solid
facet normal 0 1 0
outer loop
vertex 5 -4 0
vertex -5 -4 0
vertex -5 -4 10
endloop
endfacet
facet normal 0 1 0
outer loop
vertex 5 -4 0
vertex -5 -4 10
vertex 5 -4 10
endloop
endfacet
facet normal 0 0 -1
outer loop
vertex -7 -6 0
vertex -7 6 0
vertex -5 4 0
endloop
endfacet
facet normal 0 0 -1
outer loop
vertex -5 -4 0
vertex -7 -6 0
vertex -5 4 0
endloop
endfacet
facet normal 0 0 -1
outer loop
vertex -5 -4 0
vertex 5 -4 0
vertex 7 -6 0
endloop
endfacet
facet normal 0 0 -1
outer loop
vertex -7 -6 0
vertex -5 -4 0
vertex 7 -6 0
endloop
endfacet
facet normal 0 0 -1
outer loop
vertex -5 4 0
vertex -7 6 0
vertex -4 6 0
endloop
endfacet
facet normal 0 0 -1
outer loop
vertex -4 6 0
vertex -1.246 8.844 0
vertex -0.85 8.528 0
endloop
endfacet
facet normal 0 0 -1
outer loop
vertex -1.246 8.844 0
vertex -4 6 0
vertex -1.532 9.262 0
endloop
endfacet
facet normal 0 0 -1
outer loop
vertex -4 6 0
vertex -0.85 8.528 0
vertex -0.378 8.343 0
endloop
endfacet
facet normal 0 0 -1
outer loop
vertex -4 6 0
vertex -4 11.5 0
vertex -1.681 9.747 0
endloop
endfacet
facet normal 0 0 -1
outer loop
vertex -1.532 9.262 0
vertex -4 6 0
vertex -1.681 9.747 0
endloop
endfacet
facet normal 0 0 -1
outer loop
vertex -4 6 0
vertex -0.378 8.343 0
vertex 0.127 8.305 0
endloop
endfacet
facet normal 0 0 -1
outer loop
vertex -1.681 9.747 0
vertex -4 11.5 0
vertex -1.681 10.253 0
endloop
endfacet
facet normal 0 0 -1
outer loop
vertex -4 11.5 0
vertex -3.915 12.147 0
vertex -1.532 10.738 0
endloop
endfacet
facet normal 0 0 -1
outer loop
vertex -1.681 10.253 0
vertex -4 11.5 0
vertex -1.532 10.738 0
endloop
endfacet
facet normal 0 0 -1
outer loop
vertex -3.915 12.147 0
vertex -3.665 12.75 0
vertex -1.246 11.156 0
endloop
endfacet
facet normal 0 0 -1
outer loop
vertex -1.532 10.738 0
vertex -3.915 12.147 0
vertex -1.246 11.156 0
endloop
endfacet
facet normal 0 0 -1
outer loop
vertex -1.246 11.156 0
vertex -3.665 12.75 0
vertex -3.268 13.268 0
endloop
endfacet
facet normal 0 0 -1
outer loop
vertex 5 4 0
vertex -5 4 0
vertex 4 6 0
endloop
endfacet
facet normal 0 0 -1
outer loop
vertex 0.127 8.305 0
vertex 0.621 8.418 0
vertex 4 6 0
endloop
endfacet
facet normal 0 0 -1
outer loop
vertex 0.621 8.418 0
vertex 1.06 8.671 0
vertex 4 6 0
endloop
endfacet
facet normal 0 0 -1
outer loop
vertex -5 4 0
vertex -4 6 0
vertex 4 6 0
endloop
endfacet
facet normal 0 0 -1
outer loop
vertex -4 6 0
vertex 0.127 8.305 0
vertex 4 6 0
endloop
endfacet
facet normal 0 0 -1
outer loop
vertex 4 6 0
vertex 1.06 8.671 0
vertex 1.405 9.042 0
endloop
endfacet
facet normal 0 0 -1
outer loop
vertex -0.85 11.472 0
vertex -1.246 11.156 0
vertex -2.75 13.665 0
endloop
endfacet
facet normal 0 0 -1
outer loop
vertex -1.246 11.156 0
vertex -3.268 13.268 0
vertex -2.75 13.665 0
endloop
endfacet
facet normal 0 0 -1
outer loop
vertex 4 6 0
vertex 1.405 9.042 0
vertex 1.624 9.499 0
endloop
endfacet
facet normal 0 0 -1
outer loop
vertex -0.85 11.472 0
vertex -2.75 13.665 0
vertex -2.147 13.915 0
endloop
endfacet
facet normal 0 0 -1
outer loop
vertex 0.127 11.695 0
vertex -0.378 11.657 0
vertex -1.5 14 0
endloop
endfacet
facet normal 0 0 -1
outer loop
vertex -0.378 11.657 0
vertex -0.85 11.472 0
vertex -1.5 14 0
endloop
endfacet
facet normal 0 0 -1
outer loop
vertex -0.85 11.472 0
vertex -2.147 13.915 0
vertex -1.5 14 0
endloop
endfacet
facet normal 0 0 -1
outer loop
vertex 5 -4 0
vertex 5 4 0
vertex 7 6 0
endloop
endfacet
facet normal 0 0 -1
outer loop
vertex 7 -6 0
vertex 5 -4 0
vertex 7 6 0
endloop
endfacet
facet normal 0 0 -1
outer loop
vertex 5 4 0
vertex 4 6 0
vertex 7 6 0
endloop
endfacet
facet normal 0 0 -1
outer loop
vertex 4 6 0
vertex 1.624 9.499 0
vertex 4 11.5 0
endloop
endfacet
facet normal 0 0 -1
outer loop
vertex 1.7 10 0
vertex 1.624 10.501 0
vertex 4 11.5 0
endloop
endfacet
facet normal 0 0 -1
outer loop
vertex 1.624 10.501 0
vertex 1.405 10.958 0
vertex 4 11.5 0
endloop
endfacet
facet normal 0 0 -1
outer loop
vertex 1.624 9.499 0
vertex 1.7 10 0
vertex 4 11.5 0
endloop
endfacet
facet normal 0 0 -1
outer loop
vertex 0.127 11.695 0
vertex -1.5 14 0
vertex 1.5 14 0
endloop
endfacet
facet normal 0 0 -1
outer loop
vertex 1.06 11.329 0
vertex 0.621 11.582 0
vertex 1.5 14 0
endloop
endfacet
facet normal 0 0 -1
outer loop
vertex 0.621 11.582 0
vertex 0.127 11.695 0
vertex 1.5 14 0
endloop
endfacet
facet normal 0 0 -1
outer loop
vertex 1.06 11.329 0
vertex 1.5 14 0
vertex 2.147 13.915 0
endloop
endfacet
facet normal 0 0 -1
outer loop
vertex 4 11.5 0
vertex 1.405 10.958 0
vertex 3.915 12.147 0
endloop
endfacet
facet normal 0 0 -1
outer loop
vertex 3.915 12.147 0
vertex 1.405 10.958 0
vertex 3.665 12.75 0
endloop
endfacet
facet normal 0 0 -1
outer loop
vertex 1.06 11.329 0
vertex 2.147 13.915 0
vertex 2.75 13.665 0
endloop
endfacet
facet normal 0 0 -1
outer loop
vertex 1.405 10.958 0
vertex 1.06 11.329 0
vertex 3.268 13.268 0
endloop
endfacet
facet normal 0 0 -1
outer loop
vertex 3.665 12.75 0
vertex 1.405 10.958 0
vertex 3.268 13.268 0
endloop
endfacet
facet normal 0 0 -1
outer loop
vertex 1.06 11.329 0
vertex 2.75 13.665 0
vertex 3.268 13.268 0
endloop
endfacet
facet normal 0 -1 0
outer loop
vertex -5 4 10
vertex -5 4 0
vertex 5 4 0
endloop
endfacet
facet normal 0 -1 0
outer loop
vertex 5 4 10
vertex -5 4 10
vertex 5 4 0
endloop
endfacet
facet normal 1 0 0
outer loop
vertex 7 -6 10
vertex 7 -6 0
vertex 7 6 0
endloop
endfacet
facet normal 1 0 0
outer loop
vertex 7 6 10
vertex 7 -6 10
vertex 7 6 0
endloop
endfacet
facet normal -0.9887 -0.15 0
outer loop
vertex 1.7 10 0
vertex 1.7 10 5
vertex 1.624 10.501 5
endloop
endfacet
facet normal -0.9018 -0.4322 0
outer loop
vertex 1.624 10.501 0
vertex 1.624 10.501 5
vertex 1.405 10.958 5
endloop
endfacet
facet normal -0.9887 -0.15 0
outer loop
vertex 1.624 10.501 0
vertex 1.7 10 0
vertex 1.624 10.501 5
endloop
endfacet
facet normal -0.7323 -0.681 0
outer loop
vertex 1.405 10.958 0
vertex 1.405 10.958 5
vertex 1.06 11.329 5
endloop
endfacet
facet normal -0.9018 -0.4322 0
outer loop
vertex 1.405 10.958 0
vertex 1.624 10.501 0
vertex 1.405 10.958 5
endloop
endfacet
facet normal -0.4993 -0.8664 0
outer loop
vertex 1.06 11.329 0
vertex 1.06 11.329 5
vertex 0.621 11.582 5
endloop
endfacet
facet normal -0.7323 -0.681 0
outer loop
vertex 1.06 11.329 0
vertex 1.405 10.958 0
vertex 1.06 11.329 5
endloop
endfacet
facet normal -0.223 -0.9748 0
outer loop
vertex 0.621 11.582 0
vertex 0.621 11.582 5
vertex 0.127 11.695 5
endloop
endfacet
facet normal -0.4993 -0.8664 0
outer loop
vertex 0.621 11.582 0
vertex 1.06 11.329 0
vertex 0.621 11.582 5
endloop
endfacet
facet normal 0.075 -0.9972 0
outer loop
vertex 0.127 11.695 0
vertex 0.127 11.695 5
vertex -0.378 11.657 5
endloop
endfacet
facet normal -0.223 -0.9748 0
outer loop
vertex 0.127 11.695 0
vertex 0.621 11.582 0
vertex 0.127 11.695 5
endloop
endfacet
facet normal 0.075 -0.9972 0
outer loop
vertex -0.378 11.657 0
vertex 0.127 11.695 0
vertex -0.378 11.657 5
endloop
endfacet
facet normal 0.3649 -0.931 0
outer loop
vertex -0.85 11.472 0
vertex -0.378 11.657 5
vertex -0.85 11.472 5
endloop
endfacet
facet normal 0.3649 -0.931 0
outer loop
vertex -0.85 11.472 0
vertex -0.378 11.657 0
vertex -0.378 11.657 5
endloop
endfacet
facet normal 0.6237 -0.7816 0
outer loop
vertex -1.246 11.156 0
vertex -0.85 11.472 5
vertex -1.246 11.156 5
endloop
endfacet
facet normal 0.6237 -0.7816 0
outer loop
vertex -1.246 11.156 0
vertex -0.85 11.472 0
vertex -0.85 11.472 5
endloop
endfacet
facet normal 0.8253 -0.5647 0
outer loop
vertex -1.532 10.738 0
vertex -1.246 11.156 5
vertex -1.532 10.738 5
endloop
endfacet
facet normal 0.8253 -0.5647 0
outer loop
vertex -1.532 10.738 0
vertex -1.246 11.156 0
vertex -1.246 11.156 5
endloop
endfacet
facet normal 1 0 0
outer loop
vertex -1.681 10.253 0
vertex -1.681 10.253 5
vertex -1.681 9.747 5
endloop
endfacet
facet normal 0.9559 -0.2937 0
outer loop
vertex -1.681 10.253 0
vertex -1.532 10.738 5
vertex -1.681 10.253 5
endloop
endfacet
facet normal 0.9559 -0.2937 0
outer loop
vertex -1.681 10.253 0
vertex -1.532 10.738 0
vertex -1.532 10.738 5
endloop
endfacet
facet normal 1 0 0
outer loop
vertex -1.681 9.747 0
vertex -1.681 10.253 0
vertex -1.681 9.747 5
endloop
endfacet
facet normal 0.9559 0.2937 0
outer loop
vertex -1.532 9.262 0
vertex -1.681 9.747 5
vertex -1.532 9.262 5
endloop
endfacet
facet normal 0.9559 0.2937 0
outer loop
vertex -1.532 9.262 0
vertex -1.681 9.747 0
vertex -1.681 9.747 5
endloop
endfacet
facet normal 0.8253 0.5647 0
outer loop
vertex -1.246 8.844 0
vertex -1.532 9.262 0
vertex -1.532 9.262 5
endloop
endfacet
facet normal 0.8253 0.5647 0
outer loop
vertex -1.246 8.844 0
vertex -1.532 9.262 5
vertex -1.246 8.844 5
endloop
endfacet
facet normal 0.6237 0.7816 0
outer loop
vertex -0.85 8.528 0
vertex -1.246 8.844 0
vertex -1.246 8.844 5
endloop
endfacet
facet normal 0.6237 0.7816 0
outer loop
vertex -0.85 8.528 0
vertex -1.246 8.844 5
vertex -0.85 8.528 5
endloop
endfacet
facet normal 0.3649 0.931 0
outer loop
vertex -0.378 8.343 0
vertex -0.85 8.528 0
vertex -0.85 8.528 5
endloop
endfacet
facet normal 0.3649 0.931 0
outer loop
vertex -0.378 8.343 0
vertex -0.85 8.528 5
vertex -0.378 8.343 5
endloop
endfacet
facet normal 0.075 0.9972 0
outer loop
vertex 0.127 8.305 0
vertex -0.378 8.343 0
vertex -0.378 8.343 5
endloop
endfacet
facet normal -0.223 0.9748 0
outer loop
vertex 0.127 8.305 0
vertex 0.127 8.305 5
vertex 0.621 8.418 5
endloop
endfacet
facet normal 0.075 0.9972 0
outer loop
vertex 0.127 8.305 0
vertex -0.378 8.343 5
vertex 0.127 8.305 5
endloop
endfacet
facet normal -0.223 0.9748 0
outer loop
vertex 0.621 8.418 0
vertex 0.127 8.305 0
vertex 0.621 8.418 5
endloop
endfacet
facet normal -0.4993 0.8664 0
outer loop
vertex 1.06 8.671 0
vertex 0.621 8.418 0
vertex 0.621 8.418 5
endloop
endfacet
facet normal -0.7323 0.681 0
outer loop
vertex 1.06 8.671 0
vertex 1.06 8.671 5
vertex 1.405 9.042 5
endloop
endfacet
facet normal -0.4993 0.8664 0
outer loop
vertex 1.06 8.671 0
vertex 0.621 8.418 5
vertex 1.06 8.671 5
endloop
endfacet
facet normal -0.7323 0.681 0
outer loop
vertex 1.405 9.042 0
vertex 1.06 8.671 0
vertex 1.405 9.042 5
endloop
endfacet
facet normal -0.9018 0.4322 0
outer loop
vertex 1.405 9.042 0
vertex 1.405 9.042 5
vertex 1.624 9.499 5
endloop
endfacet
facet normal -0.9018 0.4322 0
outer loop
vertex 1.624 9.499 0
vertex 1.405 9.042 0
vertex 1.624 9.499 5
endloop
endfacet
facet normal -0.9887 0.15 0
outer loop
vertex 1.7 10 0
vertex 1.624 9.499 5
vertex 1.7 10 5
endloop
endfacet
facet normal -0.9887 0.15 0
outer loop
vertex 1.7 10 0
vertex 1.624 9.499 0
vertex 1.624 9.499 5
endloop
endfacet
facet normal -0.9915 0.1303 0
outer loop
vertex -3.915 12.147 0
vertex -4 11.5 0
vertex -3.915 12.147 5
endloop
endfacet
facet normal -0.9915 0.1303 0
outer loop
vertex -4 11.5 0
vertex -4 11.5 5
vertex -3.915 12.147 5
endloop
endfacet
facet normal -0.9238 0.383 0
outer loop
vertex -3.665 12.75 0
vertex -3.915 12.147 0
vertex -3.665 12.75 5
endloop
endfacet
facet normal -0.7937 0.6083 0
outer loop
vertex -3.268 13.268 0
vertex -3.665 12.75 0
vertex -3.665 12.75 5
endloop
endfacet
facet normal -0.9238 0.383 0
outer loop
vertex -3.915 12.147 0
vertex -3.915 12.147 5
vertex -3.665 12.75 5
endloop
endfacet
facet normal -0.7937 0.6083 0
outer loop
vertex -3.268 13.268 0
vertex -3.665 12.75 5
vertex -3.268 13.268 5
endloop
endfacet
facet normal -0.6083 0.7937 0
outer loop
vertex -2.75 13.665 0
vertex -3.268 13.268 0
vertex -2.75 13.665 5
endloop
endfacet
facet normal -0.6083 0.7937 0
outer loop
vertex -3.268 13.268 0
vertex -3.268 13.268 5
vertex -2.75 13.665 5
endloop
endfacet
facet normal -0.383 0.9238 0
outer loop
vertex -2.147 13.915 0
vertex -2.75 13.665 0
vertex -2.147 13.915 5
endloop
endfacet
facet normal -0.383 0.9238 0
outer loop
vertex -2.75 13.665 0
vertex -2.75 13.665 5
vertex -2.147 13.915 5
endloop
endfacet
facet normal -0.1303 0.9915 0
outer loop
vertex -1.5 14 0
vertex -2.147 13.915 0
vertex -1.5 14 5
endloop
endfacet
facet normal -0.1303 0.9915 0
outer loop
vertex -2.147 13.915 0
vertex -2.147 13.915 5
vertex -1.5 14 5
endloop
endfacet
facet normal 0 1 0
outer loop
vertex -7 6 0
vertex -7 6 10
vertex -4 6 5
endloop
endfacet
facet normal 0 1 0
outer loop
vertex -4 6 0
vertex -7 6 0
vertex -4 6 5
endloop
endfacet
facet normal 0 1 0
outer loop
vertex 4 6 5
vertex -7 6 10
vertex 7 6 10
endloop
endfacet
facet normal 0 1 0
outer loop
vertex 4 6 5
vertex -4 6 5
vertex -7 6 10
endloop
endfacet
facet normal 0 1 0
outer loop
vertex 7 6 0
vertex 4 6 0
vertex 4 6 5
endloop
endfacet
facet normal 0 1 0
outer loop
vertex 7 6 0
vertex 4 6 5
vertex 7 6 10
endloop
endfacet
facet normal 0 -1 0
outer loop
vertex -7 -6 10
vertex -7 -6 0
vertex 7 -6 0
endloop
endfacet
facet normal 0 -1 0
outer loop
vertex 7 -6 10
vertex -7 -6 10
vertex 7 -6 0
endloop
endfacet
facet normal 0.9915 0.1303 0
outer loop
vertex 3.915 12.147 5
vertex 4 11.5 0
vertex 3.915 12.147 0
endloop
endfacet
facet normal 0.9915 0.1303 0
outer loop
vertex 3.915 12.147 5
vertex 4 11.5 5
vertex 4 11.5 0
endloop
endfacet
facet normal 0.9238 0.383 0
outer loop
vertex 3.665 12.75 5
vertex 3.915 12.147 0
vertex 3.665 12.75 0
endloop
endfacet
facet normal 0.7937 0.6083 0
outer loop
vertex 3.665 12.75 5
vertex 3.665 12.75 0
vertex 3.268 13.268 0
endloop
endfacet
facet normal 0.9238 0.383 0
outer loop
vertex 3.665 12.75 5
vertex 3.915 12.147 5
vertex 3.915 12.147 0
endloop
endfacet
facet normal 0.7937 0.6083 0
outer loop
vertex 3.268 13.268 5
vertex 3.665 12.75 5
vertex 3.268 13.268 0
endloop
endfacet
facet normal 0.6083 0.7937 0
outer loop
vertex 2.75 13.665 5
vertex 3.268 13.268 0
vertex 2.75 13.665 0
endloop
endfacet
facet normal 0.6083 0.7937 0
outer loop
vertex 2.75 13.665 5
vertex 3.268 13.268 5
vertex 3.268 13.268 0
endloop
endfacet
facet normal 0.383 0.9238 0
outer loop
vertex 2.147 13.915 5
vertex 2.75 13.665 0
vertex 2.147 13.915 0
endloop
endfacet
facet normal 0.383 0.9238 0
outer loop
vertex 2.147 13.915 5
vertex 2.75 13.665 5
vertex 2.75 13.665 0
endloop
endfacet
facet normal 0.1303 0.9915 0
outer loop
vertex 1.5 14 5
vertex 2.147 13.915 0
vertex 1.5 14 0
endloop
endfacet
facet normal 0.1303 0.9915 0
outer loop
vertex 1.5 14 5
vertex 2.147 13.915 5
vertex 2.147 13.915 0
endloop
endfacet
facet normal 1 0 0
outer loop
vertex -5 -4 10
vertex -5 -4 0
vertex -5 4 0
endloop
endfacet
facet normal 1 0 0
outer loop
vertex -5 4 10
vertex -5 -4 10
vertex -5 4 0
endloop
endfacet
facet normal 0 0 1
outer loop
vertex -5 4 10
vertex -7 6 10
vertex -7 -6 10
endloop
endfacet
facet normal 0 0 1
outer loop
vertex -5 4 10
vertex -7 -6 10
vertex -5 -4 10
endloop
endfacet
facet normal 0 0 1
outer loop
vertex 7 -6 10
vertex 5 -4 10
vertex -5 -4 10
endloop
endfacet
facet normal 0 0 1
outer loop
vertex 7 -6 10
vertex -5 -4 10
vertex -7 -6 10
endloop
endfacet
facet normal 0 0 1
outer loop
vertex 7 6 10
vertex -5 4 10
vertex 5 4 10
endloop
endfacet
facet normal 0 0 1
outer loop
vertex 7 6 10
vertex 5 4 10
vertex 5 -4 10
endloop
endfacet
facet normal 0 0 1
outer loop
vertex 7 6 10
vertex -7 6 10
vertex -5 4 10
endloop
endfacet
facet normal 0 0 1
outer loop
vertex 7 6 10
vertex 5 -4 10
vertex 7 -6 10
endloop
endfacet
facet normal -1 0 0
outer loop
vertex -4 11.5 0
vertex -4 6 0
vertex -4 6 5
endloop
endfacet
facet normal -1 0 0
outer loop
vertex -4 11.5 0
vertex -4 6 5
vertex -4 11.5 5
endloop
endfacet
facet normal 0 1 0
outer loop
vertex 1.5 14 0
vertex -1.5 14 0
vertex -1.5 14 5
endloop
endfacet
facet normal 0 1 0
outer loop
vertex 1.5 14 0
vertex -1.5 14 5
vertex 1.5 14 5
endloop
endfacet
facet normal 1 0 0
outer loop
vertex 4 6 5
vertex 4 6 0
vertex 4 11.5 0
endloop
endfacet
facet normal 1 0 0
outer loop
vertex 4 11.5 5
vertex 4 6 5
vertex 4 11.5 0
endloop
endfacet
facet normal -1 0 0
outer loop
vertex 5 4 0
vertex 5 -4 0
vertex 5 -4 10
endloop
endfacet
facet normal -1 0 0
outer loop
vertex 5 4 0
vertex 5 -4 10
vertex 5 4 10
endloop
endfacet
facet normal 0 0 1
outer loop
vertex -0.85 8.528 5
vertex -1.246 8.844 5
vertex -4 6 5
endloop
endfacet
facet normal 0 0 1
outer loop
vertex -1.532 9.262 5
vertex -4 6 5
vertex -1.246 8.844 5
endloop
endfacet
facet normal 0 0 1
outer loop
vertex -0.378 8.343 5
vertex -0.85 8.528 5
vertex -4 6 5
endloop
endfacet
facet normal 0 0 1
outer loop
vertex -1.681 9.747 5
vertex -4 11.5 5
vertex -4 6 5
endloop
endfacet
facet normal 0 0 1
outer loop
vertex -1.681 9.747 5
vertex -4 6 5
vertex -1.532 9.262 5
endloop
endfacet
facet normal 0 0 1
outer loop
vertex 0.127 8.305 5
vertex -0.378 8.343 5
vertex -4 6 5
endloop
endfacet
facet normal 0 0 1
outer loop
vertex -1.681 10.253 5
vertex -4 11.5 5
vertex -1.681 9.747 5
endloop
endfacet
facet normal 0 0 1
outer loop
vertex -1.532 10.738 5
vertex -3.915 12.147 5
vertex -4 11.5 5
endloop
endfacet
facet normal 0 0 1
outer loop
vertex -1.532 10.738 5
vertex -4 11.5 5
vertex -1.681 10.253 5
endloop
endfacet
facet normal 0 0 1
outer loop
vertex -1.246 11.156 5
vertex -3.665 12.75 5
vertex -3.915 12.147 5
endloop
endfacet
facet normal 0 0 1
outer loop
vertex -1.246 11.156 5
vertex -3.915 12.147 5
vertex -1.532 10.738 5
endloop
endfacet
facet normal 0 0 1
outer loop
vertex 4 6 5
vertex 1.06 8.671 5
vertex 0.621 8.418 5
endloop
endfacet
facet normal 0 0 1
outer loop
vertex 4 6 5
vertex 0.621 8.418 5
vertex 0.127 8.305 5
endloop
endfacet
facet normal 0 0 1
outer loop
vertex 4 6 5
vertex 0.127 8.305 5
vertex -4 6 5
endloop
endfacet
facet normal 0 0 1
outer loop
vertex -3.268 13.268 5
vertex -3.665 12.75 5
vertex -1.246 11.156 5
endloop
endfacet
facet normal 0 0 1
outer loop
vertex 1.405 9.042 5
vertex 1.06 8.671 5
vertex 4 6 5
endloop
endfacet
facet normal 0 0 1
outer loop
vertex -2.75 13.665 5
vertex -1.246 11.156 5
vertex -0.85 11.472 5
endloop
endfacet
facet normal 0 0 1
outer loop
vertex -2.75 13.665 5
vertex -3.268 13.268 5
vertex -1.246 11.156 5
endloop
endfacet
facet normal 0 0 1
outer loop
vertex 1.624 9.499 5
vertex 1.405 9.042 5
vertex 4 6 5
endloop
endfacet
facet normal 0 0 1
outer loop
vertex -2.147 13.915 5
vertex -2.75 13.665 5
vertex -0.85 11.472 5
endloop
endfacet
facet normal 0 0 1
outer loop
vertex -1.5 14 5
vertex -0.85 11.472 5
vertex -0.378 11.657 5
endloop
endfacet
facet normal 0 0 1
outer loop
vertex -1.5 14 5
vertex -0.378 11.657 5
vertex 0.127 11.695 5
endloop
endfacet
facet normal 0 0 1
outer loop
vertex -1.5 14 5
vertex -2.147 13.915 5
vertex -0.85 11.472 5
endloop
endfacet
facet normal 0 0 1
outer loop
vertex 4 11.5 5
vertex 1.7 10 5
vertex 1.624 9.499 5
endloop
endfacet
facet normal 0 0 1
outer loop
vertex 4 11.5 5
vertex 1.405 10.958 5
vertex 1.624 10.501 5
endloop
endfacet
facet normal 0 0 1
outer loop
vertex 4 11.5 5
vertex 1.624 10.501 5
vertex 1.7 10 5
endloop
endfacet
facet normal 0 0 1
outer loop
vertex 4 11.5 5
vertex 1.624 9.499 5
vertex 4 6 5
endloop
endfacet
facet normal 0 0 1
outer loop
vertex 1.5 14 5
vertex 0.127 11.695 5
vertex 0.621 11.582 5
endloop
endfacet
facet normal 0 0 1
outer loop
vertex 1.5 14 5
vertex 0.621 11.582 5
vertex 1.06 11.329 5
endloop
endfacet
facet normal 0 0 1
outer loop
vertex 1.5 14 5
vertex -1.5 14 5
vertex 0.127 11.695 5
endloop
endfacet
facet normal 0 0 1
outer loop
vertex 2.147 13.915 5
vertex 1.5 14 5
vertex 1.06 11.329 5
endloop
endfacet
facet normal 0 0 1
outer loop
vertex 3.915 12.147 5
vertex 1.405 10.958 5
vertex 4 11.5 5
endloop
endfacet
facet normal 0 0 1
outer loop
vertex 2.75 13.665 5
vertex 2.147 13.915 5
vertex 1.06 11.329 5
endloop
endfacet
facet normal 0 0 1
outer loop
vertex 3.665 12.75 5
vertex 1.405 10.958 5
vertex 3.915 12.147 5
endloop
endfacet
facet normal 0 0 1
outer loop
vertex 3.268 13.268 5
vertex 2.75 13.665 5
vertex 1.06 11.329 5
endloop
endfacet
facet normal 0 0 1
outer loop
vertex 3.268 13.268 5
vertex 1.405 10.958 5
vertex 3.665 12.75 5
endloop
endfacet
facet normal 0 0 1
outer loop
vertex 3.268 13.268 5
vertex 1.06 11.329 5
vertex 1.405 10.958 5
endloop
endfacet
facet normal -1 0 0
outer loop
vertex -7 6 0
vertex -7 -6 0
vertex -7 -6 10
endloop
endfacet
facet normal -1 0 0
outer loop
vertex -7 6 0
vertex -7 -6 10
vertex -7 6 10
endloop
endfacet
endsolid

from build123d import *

# Parameters (mm, degrees)
SKETCH2_W           = 14
SKETCH2_H           = 12
BOSS_EXTRUDE1_DEPTH = 10
SKETCH1_W           = 10
SKETCH1_H           = 8
CUT_EXTRUDE2_DEPTH  = 11
SKETCH3_W           = 8
SKETCH3_H           = 8
BOSS_EXTRUDE2_DEPTH = 5
SKETCH4_R           = 1.7
CUT_EXTRUDE3_DEPTH  = 11
FILLET1_R           = 2.5


with BuildPart() as part:
    # Sketch2 → Boss-Extrude1 (new body)
    with BuildSketch(Plane.XY):
        Rectangle(SKETCH2_W, SKETCH2_H)
    extrude(amount=BOSS_EXTRUDE1_DEPTH)

    # Sketch1 → Cut-Extrude2 (cut, through all)
    with BuildSketch(Plane.XY):
        Rectangle(SKETCH1_W, SKETCH1_H)
    extrude(amount=CUT_EXTRUDE2_DEPTH, mode=Mode.SUBTRACT)

    # Sketch3 → Boss-Extrude2 (add)
    with BuildSketch(Plane.XY):
        with Locations((0, 10)):
            Rectangle(SKETCH3_W, SKETCH3_H)
    extrude(amount=BOSS_EXTRUDE2_DEPTH)

    # Sketch4 → Cut-Extrude3 (cut, through all)
    with BuildSketch(Plane.XY):
        with Locations((0, 10)):
            Circle(SKETCH4_R)
    extrude(amount=CUT_EXTRUDE3_DEPTH, mode=Mode.SUBTRACT)

    # Fillet1
    fillet1_edges = [part.edges().sort_by_distance(p)[0] for p in [
        (4, 14, 2.5),
        (-4, 14, 2.5),
    ]]
    fillet(fillet1_edges, radius=FILLET1_R)


solid = part.part
